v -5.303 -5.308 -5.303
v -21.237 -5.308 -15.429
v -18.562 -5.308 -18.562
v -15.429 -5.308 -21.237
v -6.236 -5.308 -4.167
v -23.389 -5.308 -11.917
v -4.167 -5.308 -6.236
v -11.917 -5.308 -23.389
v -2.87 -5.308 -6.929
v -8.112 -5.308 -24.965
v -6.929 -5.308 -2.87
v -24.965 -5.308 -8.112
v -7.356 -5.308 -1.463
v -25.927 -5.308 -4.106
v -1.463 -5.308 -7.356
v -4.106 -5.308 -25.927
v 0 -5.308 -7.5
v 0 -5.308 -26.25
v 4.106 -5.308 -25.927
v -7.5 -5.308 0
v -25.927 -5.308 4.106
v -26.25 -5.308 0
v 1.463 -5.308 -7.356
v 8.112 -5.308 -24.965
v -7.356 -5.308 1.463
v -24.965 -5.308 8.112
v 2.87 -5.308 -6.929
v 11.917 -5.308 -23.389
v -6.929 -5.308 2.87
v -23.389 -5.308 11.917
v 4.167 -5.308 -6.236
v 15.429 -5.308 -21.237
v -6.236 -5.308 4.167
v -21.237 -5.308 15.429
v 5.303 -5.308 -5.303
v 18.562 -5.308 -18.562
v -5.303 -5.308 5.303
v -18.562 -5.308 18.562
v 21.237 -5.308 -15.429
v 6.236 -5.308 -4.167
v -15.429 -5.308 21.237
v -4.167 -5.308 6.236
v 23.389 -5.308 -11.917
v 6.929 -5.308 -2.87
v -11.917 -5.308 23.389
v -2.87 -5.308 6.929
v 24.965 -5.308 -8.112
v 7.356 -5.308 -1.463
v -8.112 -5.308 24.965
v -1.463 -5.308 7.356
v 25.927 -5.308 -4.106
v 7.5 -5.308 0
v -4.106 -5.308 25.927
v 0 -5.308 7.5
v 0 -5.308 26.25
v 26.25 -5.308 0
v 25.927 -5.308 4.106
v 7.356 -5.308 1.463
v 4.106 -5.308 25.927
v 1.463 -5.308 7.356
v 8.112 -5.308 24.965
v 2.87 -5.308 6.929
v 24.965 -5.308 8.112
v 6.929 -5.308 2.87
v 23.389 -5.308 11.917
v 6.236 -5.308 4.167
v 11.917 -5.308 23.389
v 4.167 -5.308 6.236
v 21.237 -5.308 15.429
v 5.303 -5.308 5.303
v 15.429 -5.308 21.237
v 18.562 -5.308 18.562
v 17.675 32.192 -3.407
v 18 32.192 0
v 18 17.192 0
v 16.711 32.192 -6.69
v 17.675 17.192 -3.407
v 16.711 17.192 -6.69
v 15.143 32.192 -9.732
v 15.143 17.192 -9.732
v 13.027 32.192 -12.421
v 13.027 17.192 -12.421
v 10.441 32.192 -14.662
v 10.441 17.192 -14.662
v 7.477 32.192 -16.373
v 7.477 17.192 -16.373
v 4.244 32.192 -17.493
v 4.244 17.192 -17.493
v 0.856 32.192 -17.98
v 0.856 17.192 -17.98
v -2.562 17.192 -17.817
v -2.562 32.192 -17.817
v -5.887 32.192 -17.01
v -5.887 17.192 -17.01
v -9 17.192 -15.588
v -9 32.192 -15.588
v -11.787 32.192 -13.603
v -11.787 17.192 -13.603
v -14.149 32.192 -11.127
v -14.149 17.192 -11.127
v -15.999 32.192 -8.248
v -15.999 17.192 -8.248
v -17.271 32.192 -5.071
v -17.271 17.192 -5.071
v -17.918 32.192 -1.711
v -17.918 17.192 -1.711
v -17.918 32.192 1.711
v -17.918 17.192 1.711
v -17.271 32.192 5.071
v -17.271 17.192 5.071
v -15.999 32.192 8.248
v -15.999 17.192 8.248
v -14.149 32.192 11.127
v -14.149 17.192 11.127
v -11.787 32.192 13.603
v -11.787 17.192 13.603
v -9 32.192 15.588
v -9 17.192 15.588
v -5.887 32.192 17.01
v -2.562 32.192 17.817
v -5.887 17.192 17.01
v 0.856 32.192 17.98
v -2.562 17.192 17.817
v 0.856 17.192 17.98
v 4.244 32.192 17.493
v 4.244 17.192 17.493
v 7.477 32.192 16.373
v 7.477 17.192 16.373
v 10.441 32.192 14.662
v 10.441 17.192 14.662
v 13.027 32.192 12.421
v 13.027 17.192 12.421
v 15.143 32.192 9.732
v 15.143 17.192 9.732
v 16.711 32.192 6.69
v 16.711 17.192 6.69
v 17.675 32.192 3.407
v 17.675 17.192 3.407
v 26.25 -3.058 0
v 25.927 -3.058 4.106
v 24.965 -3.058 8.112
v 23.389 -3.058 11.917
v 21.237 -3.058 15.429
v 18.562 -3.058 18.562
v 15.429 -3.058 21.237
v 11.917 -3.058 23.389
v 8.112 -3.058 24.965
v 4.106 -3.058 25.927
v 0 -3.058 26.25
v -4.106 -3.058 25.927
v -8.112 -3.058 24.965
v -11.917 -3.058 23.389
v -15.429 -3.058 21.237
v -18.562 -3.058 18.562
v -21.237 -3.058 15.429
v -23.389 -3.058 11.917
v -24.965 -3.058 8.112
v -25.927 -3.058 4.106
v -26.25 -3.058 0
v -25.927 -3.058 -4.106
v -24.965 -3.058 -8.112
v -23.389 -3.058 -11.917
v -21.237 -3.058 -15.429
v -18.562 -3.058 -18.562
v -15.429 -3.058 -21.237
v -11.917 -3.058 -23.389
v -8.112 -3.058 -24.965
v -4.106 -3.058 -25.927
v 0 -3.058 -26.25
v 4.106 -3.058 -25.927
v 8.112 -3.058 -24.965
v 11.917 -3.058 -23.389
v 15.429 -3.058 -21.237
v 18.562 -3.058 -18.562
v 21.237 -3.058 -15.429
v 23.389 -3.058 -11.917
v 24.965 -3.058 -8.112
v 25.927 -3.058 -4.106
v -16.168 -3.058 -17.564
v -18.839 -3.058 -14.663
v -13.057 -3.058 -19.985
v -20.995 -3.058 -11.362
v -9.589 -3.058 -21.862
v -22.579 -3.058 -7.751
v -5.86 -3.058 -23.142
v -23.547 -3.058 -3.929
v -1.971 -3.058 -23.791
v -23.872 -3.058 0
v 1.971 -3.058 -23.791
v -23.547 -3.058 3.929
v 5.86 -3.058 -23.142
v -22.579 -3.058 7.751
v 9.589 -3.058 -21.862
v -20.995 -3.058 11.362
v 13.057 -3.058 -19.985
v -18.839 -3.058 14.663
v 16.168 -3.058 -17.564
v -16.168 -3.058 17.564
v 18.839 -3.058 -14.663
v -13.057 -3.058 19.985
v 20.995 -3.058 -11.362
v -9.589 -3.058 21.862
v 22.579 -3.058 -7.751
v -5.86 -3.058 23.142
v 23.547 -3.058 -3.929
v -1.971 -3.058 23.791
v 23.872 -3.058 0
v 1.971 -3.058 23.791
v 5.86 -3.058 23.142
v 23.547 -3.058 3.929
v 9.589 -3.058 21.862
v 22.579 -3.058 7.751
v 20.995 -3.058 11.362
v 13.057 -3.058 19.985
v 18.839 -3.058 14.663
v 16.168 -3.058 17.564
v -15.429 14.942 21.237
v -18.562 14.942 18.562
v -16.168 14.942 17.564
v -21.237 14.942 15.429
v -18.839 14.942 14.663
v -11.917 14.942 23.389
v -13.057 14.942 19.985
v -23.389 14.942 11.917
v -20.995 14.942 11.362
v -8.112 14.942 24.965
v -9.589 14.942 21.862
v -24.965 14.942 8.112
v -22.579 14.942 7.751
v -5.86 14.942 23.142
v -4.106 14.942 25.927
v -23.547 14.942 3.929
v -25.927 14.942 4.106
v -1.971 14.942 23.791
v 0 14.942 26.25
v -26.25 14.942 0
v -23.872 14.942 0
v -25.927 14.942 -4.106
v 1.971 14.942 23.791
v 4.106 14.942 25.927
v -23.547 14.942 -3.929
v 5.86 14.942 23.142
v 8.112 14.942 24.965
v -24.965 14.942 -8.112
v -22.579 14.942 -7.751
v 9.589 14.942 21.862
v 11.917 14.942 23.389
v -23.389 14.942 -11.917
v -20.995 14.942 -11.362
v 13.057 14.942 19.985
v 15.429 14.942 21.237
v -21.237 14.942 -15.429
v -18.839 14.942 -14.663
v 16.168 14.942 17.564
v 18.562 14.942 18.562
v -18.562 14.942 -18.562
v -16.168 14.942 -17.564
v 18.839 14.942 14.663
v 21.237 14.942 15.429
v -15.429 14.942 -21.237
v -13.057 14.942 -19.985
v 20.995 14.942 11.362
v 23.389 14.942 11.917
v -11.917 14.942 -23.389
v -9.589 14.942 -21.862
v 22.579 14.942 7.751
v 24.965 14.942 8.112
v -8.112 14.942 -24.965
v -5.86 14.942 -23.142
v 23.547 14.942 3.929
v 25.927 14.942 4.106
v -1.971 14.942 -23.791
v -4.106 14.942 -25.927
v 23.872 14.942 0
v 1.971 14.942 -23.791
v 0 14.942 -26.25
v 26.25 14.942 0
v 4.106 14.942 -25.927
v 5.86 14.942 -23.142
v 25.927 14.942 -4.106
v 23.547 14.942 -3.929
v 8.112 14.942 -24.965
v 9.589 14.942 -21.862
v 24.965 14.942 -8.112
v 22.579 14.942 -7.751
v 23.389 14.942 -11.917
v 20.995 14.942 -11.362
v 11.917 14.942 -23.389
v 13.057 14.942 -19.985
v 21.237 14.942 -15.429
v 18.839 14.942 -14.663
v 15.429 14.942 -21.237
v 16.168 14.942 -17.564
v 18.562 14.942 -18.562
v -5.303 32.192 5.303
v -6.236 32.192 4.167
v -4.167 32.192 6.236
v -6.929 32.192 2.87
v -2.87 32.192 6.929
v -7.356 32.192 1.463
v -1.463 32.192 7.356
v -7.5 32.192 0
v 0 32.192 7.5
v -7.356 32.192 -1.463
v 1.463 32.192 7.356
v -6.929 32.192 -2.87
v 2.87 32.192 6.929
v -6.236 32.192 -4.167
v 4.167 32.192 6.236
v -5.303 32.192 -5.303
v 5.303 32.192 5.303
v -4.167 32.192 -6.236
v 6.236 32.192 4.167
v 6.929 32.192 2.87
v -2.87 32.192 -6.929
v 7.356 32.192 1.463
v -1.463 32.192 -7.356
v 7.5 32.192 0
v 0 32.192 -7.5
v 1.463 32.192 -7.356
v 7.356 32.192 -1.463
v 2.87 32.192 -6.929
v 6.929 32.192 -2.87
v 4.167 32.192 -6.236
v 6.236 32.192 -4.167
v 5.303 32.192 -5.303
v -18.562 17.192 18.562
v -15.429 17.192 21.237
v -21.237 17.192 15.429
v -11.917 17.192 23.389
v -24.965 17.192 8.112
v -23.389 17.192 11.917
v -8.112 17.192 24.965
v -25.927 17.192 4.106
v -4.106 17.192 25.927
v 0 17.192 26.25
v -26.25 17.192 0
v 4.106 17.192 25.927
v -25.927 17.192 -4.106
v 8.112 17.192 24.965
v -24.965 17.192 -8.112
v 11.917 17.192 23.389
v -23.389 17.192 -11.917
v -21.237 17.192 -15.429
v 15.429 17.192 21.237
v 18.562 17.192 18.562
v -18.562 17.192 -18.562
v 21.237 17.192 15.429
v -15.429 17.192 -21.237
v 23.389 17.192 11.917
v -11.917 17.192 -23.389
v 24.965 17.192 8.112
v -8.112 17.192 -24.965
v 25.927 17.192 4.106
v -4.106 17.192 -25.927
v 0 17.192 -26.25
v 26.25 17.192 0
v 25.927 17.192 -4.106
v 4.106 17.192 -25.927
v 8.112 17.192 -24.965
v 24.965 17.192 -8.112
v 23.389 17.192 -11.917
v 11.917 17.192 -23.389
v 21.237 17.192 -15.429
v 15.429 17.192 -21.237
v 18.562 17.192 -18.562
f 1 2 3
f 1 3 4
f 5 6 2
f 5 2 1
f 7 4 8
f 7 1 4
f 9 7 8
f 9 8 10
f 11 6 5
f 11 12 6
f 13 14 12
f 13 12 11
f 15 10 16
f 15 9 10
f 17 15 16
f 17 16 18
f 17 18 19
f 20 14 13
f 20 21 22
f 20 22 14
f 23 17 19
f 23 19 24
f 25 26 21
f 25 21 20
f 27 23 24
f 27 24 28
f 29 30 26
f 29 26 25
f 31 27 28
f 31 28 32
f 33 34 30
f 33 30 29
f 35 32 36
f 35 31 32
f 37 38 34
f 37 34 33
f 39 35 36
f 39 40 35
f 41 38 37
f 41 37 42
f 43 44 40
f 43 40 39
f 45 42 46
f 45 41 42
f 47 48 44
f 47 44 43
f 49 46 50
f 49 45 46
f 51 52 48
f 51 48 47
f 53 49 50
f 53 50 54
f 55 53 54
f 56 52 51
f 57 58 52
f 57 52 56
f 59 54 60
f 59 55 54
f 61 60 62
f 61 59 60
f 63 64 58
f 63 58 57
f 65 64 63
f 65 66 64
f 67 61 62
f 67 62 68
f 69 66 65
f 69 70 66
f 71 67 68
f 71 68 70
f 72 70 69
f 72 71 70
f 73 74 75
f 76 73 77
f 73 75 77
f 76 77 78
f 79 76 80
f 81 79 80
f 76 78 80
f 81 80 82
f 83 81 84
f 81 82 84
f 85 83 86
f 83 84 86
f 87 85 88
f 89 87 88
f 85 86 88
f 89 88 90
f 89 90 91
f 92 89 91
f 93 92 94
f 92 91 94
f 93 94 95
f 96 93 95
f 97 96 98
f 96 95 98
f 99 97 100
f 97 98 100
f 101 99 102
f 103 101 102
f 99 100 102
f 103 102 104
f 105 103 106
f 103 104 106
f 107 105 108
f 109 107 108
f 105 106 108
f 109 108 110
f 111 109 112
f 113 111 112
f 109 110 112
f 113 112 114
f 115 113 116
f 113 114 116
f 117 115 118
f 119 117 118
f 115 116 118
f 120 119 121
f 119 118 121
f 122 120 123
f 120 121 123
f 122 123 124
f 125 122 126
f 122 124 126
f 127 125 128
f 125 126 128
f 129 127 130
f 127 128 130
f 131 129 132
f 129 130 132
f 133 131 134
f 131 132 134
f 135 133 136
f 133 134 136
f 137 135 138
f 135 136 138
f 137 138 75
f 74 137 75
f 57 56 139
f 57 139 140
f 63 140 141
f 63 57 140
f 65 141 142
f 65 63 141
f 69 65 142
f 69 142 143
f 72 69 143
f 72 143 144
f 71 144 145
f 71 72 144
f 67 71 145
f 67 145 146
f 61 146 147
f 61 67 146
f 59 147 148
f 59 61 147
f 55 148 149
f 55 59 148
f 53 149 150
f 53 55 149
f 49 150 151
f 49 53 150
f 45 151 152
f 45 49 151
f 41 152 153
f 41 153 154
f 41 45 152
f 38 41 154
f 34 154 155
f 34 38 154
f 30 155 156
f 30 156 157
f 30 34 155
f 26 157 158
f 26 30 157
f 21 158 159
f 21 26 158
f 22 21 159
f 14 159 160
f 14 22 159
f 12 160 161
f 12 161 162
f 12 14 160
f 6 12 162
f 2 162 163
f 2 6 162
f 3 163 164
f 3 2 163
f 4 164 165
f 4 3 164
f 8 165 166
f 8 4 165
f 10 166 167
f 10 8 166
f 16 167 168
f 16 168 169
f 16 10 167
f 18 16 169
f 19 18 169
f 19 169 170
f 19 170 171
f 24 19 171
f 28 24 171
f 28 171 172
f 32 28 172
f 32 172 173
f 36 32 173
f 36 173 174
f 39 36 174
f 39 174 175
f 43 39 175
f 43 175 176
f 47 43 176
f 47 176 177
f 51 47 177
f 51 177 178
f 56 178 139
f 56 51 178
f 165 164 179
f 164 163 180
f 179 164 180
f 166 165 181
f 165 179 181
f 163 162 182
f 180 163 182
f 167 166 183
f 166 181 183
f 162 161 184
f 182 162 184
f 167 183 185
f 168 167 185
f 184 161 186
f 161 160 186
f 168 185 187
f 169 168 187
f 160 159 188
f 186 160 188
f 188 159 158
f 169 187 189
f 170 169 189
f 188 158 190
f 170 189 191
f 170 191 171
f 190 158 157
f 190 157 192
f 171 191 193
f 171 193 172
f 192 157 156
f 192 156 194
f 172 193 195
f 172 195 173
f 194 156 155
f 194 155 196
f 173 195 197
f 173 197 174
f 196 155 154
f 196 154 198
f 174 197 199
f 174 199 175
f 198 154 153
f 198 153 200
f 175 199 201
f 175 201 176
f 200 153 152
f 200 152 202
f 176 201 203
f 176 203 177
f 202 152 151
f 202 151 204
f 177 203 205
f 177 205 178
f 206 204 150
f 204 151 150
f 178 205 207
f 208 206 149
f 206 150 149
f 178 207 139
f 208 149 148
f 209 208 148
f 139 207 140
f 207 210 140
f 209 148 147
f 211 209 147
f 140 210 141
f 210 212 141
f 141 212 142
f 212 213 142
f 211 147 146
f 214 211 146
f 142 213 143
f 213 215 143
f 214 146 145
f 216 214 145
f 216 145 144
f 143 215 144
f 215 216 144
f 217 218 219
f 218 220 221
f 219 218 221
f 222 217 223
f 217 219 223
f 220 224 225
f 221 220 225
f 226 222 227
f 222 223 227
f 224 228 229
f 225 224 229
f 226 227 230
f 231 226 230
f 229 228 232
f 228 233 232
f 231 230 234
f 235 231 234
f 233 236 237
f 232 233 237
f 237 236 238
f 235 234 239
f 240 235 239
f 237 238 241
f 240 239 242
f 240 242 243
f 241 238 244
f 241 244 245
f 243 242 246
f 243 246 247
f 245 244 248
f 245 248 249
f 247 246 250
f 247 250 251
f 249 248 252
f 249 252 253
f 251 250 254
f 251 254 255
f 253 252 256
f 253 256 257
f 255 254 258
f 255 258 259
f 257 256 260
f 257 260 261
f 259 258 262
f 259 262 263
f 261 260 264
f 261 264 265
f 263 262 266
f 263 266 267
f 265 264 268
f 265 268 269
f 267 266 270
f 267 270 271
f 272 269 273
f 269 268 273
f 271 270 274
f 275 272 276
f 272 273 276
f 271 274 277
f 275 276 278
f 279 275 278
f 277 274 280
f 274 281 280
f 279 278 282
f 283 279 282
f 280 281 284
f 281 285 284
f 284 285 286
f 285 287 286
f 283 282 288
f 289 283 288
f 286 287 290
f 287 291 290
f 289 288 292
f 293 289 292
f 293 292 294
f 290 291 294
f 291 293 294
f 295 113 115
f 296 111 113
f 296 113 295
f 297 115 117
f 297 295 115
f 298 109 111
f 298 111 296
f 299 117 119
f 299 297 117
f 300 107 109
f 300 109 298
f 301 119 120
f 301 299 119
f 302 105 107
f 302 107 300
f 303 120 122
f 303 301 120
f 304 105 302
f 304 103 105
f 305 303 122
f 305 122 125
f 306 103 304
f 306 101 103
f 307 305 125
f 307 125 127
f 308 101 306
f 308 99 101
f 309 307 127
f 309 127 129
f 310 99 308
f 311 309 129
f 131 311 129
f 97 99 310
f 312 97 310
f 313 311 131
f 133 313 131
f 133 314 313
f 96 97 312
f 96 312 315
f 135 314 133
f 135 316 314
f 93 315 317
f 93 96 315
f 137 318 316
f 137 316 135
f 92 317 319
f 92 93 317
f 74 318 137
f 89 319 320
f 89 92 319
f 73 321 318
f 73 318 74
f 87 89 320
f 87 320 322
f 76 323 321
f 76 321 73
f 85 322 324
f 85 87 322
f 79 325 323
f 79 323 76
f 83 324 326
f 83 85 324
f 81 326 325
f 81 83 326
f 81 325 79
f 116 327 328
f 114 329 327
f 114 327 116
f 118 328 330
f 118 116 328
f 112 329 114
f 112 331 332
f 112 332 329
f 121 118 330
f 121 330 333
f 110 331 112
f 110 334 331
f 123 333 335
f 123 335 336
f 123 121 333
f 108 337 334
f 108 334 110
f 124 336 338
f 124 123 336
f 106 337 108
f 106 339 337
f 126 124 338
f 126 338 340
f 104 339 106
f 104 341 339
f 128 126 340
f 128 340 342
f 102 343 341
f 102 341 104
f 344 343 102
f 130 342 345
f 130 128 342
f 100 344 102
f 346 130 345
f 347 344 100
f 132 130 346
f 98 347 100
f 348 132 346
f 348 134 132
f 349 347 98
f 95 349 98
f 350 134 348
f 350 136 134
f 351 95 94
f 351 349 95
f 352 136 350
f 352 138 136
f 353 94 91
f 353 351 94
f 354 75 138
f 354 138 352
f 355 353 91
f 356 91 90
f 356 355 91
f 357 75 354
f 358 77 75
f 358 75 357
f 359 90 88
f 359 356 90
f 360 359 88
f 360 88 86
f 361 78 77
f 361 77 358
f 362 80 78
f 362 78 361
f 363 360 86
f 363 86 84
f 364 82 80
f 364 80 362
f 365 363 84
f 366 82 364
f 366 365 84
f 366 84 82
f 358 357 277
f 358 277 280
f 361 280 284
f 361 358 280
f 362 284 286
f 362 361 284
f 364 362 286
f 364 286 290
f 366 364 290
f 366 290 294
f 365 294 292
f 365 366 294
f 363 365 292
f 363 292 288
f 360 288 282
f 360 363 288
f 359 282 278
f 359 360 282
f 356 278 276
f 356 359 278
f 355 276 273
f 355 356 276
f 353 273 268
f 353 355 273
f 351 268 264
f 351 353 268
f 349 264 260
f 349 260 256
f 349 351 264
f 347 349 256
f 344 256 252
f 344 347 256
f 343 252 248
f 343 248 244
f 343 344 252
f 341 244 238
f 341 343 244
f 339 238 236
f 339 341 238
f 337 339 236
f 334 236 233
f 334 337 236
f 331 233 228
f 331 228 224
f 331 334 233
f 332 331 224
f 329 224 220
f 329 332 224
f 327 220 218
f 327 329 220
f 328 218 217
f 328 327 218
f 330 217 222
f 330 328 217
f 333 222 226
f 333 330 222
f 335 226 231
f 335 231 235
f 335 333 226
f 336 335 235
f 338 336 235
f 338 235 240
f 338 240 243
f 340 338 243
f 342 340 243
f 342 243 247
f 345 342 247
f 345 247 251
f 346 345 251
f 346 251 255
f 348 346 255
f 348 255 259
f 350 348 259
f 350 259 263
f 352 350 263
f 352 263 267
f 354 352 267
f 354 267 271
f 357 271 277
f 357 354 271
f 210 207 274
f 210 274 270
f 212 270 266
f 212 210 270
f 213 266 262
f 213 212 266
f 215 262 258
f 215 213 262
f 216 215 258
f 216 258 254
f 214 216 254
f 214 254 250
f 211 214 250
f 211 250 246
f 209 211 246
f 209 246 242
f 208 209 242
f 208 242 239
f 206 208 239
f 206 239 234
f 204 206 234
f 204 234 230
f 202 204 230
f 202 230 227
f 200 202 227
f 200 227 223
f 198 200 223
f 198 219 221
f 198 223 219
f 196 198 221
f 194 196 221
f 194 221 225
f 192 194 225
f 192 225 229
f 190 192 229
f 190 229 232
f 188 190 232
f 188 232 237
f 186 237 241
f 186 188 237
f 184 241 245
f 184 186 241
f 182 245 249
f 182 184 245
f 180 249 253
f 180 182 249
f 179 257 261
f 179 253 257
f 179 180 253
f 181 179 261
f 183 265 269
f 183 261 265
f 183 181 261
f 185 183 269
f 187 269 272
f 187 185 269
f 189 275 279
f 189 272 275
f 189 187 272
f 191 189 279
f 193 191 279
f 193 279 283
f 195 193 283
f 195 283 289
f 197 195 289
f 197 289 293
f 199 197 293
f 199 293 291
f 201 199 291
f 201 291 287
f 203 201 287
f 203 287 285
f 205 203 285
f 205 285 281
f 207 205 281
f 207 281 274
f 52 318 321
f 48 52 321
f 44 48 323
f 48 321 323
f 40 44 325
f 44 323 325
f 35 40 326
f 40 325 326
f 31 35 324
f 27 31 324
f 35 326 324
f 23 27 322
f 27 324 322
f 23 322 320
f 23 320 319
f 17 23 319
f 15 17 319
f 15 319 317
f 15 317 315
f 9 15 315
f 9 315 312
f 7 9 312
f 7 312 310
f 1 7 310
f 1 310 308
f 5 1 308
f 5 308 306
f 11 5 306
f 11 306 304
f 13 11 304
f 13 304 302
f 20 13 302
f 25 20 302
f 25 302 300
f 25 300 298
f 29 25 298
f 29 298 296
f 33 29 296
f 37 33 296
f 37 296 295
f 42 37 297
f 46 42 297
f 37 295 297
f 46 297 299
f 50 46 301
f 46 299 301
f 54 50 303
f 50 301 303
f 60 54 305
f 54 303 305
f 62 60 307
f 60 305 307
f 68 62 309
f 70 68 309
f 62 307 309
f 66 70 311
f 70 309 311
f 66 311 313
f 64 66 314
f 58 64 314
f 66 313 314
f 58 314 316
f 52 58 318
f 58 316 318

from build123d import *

# Parameters (mm, degrees)
SKETCH1_R           = 24.255
BOSS_EXTRUDE1_DEPTH = 15
SKETCH2_R           = 12
BOSS_EXTRUDE2_DEPTH = 10
SKETCH3_R           = 5
CUT_EXTRUDE1_DEPTH  = 26
SKETCH4_R           = 24.255
SKETCH4_R_2         = 15.915
CUT_EXTRUDE3_DEPTH  = 15
SKETCH5_R           = 17.5
SKETCH5_R_2         = 15.915
BOSS_EXTRUDE3_DEPTH = 1.5
SKETCH6_R           = 17.5
SKETCH6_R_2         = 15.915
BOSS_EXTRUDE4_DEPTH = 1.5
SCALE1_SCALE        = 1.5


with BuildPart() as part:
    # Sketch1 → Boss-Extrude1 (new body)
    with BuildSketch(Plane(origin=(0, 0, 0), x_dir=(1, 0, 0), z_dir=(0, 1, 0))):
        Circle(SKETCH1_R)
    extrude(amount=BOSS_EXTRUDE1_DEPTH)

    # Sketch2 → Boss-Extrude2 (add)
    with BuildSketch(Plane(origin=(0, 15, 0), x_dir=(1, 0, 0), z_dir=(0, 1, 0))):
        Circle(SKETCH2_R)
    extrude(amount=BOSS_EXTRUDE2_DEPTH)

    # Sketch3 → Cut-Extrude1 (cut)
    with BuildSketch(Plane(origin=(0, 25, 0), x_dir=(1, 0, 0), z_dir=(0, 1, 0))):
        Circle(SKETCH3_R)
    extrude(amount=-CUT_EXTRUDE1_DEPTH, mode=Mode.SUBTRACT)

    # Sketch4 → Cut-Extrude3 (cut)
    with BuildSketch(Plane.XZ):
        Circle(SKETCH4_R)
        Circle(SKETCH4_R_2, mode=Mode.SUBTRACT)
    extrude(amount=-CUT_EXTRUDE3_DEPTH, mode=Mode.SUBTRACT)

    # Sketch5 → Boss-Extrude3 (add)
    with BuildSketch(Plane.XZ):
        Circle(SKETCH5_R)
        Circle(SKETCH5_R_2, mode=Mode.SUBTRACT)
    extrude(amount=-BOSS_EXTRUDE3_DEPTH)

    # Sketch6 → Boss-Extrude4 (add)
    with BuildSketch(Plane(origin=(0, 15, 0), x_dir=(1, 0, 0), z_dir=(0, 1, 0))):
        Circle(SKETCH6_R)
        Circle(SKETCH6_R_2, mode=Mode.SUBTRACT)
    extrude(amount=-BOSS_EXTRUDE4_DEPTH)


with BuildPart() as part_1:
    # Scale1: scaled about (0, 10.616360153, 0)
    add(part.part.scale(SCALE1_SCALE).moved(Location((0, -5.308180077, 0))))


solid = part_1.part
